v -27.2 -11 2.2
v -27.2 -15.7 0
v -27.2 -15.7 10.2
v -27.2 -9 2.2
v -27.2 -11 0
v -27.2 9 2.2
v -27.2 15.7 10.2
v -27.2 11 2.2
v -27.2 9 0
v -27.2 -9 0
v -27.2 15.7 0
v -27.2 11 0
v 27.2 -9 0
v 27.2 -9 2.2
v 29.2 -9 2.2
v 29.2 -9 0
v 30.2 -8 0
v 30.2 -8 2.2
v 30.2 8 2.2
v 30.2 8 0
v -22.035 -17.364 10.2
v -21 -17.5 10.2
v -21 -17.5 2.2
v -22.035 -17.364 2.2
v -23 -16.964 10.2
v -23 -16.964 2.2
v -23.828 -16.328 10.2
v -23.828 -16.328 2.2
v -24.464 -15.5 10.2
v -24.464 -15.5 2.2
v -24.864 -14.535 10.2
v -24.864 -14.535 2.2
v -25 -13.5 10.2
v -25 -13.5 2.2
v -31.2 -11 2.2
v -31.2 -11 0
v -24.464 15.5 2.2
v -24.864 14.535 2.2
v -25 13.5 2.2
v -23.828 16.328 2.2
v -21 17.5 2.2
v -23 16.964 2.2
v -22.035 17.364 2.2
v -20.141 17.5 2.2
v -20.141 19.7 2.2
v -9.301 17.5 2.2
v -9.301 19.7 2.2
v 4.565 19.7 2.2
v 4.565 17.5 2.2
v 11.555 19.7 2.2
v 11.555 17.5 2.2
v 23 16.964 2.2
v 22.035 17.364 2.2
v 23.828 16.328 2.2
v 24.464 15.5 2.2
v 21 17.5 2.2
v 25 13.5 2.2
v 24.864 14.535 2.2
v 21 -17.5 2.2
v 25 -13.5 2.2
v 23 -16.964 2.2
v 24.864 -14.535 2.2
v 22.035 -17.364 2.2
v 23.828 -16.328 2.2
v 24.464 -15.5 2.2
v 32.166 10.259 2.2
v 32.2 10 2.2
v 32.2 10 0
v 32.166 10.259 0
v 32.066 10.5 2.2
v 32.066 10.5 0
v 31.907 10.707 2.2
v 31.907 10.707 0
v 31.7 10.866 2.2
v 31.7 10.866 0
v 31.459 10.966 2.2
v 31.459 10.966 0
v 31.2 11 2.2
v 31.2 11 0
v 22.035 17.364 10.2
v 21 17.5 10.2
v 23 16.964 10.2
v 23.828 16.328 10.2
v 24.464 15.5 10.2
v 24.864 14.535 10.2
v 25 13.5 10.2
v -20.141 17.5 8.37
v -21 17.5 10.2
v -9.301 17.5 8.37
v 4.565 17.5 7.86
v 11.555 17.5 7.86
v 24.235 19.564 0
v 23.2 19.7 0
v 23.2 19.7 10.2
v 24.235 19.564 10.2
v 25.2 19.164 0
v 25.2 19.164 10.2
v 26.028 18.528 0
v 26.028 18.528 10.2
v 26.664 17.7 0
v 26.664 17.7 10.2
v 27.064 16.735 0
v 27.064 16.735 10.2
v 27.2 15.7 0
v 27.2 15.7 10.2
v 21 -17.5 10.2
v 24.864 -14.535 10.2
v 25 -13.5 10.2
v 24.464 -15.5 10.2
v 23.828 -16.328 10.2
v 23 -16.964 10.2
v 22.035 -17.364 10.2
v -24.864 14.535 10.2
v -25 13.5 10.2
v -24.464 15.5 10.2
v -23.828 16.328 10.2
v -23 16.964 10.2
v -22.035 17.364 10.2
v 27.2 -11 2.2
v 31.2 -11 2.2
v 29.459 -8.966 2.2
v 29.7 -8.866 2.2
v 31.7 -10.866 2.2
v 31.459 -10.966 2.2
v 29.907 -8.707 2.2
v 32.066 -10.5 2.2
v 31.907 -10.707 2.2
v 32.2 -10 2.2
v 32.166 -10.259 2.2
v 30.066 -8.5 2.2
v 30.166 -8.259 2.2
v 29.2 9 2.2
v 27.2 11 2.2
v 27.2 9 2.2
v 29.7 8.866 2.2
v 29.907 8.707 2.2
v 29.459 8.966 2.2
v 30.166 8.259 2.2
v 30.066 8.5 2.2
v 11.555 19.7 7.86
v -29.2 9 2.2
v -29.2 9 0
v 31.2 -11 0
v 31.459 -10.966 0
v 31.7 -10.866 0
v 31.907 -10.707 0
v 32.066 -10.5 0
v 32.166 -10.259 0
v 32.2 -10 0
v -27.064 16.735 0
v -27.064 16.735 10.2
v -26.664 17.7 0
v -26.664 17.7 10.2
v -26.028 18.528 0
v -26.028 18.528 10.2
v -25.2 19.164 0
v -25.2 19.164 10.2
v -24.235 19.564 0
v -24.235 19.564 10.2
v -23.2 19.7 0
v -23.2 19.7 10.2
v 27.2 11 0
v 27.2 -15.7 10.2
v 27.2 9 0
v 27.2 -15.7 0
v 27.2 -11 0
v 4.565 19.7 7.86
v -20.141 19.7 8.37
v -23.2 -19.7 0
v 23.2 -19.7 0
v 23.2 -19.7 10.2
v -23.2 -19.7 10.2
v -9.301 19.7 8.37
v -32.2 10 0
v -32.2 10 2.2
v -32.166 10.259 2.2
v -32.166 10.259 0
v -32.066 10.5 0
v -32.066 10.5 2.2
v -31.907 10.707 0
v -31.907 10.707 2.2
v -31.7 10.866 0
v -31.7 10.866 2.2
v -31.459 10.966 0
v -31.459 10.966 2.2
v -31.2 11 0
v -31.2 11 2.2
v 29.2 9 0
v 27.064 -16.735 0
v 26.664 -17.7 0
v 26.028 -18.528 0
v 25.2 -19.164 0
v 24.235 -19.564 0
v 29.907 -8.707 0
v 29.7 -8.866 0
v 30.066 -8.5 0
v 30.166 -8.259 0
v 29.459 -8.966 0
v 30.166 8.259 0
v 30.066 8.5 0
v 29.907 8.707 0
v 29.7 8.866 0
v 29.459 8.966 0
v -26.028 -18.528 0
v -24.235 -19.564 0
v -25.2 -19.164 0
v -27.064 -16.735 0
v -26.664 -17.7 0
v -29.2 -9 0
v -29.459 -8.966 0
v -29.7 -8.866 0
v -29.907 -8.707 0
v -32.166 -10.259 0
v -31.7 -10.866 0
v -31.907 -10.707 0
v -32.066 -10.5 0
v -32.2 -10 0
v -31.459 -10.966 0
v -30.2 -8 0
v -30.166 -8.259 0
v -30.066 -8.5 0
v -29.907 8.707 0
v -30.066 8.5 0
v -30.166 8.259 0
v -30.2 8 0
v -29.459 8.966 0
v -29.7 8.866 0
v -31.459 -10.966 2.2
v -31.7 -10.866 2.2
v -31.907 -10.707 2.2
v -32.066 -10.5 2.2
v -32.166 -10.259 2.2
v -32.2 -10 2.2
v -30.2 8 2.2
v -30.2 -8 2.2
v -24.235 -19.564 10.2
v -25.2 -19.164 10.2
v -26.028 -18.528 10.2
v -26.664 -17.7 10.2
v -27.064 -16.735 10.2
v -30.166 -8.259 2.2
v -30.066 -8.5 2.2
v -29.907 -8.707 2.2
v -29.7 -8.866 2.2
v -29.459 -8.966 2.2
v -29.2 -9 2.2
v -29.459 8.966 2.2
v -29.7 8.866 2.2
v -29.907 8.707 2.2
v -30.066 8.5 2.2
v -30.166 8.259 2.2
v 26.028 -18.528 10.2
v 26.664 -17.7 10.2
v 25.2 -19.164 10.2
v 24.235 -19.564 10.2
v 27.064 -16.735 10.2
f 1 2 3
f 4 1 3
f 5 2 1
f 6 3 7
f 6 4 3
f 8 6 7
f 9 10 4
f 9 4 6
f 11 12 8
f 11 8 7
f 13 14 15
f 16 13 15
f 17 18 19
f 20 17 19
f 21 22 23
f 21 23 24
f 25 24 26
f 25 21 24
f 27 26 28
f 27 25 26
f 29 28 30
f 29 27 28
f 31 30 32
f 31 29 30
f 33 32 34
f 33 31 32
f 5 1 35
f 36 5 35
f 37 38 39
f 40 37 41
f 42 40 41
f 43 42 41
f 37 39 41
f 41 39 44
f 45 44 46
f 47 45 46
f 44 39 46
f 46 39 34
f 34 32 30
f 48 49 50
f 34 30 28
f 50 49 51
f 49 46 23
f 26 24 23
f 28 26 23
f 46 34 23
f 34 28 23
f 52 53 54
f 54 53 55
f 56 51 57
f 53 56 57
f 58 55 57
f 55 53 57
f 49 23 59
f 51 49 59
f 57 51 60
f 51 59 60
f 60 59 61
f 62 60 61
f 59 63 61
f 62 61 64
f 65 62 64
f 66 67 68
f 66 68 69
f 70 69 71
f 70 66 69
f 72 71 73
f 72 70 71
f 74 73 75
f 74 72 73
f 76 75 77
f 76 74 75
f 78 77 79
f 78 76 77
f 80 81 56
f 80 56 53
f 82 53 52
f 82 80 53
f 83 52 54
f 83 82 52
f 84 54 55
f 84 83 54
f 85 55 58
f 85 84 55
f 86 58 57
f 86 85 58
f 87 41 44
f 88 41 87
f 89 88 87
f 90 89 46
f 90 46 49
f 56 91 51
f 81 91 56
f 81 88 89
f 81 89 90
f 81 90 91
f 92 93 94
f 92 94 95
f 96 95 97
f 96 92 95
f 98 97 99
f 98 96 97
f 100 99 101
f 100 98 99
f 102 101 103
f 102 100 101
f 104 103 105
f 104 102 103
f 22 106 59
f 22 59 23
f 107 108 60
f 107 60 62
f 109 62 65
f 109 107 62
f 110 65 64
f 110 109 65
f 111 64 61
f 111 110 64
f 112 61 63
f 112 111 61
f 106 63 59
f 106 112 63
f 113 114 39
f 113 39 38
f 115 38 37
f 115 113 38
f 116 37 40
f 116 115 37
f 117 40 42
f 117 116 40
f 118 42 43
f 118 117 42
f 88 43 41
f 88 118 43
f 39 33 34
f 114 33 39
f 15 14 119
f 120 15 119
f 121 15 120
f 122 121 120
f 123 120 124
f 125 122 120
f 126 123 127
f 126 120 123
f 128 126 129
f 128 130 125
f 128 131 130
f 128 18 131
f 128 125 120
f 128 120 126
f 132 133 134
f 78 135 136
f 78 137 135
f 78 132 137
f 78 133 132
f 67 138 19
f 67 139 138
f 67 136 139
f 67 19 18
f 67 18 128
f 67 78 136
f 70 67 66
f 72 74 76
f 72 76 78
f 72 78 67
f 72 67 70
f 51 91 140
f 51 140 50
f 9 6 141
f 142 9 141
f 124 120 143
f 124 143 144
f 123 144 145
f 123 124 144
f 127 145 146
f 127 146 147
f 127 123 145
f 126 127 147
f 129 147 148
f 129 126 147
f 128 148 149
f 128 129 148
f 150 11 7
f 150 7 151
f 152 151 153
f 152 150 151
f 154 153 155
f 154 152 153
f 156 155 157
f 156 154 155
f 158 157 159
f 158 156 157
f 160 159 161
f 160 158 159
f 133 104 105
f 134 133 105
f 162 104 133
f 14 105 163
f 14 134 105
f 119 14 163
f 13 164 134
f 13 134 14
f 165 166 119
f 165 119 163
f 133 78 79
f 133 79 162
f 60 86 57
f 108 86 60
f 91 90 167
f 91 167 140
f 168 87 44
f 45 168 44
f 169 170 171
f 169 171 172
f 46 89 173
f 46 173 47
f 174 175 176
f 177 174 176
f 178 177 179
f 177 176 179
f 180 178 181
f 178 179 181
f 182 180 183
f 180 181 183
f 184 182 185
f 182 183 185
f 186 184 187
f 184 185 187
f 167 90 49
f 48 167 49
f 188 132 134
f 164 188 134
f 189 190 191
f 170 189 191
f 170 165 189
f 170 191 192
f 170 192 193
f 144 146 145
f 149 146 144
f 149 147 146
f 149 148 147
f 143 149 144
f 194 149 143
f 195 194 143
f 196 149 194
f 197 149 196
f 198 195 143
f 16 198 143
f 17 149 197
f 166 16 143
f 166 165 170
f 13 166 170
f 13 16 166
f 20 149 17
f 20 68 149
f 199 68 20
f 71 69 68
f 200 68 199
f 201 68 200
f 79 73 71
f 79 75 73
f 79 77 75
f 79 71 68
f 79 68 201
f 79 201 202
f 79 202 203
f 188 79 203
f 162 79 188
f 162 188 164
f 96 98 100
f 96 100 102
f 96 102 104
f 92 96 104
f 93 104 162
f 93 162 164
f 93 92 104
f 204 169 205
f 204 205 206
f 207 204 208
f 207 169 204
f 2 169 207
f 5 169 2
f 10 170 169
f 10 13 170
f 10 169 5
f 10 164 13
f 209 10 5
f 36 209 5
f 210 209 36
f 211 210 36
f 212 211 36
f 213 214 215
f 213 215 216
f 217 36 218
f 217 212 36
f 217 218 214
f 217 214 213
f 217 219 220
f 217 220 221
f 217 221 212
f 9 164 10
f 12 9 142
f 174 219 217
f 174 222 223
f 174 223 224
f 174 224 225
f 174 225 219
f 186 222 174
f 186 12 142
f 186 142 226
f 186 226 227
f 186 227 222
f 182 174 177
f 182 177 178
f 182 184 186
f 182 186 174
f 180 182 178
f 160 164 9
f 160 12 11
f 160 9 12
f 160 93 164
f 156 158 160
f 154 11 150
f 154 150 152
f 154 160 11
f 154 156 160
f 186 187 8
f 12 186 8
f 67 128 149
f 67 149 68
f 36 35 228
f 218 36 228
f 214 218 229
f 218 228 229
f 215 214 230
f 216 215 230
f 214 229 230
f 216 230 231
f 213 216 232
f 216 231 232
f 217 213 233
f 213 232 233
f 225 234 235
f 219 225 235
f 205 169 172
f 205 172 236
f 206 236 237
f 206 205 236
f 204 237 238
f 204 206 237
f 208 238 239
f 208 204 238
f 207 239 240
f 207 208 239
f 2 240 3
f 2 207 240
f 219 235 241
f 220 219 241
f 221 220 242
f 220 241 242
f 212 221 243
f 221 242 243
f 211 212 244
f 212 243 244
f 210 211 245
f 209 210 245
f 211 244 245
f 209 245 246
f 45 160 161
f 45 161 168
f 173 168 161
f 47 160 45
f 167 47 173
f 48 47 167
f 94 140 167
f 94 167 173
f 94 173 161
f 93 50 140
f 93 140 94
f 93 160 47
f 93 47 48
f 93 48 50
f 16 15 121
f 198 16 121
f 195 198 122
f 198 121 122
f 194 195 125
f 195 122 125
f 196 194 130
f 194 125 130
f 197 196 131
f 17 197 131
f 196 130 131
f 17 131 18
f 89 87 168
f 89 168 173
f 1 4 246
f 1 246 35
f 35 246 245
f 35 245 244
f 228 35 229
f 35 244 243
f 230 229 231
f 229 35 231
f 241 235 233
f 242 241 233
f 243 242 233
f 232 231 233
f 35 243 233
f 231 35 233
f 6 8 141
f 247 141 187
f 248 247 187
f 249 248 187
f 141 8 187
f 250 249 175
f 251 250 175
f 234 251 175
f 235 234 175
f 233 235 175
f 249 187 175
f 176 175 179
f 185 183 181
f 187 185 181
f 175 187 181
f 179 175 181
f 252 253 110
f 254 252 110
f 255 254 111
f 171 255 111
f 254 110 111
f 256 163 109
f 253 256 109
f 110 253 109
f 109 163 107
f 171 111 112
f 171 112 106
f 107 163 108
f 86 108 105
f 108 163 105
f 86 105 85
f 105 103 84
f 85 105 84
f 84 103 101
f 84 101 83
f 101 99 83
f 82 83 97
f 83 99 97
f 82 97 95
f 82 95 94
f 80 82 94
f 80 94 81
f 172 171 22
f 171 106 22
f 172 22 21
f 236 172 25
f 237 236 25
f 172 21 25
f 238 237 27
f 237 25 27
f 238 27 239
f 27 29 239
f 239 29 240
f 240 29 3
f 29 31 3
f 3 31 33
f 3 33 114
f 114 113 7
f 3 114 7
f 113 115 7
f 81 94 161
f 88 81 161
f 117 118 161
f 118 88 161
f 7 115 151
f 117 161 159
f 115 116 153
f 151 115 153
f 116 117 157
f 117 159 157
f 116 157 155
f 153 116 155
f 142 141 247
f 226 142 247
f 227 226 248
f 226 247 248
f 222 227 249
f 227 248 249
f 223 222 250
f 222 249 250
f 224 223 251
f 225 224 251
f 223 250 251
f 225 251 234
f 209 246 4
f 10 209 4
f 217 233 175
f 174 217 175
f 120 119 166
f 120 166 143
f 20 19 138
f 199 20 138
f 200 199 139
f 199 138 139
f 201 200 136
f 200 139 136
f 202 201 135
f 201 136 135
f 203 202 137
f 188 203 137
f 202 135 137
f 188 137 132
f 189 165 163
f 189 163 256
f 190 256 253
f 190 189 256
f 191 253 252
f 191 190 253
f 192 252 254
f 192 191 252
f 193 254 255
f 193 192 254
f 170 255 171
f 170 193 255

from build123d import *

# Parameters (mm, degrees)
BOSS_EXTRUDE1_DEPTH = 10.2
CUT_EXTRUDE1_DEPTH  = 8
BOSS_EXTRUDE2_DEPTH = 2.2
CUT_EXTRUDE2_DEPTH  = 2.2
SKETCH6_W           = 10.84
SKETCH6_H           = 6.17
CUT_EXTRUDE3_DEPTH  = 46
SKETCH8_W           = 6.99
SKETCH8_H           = 5.66
CUT_EXTRUDE4_DEPTH  = 29


with BuildPart() as part:
    # Sketch1 → Boss-Extrude1 (new body)
    with BuildSketch(Plane.XY):
        with BuildLine():
            Line((23.2, -19.7), (-23.2, -19.7))
            ThreePointArc((-23.2, -19.7), (-26.028427125, -18.528427125), (-27.2, -15.7))
            Line((-27.2, -15.7), (-27.2, 15.7))
            ThreePointArc((-27.2, 15.7), (-26.028427125, 18.528427125), (-23.2, 19.7))
            Line((-23.2, 19.7), (23.2, 19.7))
            ThreePointArc((23.2, 19.7), (26.028427125, 18.528427125), (27.2, 15.7))
            Line((27.2, 15.7), (27.2, -15.7))
            ThreePointArc((27.2, -15.7), (26.028427125, -18.528427125), (23.2, -19.7))
        make_face()
    extrude(amount=BOSS_EXTRUDE1_DEPTH)

    # Sketch2 → Cut-Extrude1 (cut)
    with BuildSketch(Plane.XY.offset(10.2)):
        with BuildLine():
            Line((21, -17.5), (-21, -17.5))
            ThreePointArc((-21, -17.5), (-23.828427125, -16.328427125), (-25, -13.5))
            Line((-25, -13.5), (-25, 13.5))
            ThreePointArc((-25, 13.5), (-23.828427125, 16.328427125), (-21, 17.5))
            Line((-21, 17.5), (21, 17.5))
            ThreePointArc((21, 17.5), (23.828427125, 16.328427125), (25, 13.5))
            Line((25, 13.5), (25, -13.5))
            ThreePointArc((25, -13.5), (23.828427125, -16.328427125), (21, -17.5))
        make_face()
    extrude(amount=-CUT_EXTRUDE1_DEPTH, mode=Mode.SUBTRACT)

    # Sketch4 → Boss-Extrude2 (add)
    with BuildSketch(Plane.XY.offset(2.2)):
        with BuildLine():
            Line((27.2, -11), (31.2, -11))
            ThreePointArc((31.2, -11), (31.907106781, -10.707106781), (32.2, -10))
            Line((32.2, -10), (32.2, 10))
            ThreePointArc((32.2, 10), (31.907106781, 10.707106781), (31.2, 11))
            Line((31.2, 11), (27.2, 11))
            Line((27.2, 11), (27.2, -11))
        make_face()
        with BuildLine():
            Line((-27.2, 11), (-27.2, -11))
            Line((-27.2, -11), (-31.2, -11))
            ThreePointArc((-31.2, -11), (-31.907106781, -10.707106781), (-32.2, -10))
            Line((-32.2, -10), (-32.2, 10))
            ThreePointArc((-32.2, 10), (-31.907106781, 10.707106781), (-31.2, 11))
            Line((-31.2, 11), (-27.2, 11))
        make_face()
    extrude(amount=-BOSS_EXTRUDE2_DEPTH)

    # Sketch5 → Cut-Extrude2 (cut)
    with BuildSketch(Plane.XY.offset(2.2)):
        with BuildLine():
            Line((27.2, -9), (29.2, -9))
            ThreePointArc((29.2, -9), (29.907106781, -8.707106781), (30.2, -8))
            Line((30.2, -8), (30.2, 8))
            ThreePointArc((30.2, 8), (29.907106781, 8.707106781), (29.2, 9))
            Line((29.2, 9), (27.2, 9))
            Line((27.2, 9), (27.2, -9))
        make_face()
        with BuildLine():
            Line((-27.2, -9), (-27.2, 9))
            Line((-27.2, 9), (-29.2, 9))
            ThreePointArc((-29.2, 9), (-29.907106781, 8.707106781), (-30.2, 8))
            Line((-30.2, 8), (-30.2, -8))
            ThreePointArc((-30.2, -8), (-29.907106781, -8.707106781), (-29.2, -9))
            Line((-29.2, -9), (-27.2, -9))
        make_face()
    extrude(amount=-CUT_EXTRUDE2_DEPTH, mode=Mode.SUBTRACT)

    # Sketch6 → Cut-Extrude3 (cut)
    with BuildSketch(Plane(origin=(0, 0, 0), x_dir=(1, 0, 0), z_dir=(0, 1, 0))):
        with Locations((-14.720967814, -5.285)):
            Rectangle(SKETCH6_W, SKETCH6_H)
    extrude(amount=CUT_EXTRUDE3_DEPTH, mode=Mode.SUBTRACT)

    # Sketch8 → Cut-Extrude4 (cut)
    with BuildSketch(Plane(origin=(0, 0, 0), x_dir=(1, 0, 0), z_dir=(0, 1, 0))):
        with Locations((8.059896405, -5.03)):
            Rectangle(SKETCH8_W, SKETCH8_H)
    extrude(amount=CUT_EXTRUDE4_DEPTH, mode=Mode.SUBTRACT)


solid = part.part
